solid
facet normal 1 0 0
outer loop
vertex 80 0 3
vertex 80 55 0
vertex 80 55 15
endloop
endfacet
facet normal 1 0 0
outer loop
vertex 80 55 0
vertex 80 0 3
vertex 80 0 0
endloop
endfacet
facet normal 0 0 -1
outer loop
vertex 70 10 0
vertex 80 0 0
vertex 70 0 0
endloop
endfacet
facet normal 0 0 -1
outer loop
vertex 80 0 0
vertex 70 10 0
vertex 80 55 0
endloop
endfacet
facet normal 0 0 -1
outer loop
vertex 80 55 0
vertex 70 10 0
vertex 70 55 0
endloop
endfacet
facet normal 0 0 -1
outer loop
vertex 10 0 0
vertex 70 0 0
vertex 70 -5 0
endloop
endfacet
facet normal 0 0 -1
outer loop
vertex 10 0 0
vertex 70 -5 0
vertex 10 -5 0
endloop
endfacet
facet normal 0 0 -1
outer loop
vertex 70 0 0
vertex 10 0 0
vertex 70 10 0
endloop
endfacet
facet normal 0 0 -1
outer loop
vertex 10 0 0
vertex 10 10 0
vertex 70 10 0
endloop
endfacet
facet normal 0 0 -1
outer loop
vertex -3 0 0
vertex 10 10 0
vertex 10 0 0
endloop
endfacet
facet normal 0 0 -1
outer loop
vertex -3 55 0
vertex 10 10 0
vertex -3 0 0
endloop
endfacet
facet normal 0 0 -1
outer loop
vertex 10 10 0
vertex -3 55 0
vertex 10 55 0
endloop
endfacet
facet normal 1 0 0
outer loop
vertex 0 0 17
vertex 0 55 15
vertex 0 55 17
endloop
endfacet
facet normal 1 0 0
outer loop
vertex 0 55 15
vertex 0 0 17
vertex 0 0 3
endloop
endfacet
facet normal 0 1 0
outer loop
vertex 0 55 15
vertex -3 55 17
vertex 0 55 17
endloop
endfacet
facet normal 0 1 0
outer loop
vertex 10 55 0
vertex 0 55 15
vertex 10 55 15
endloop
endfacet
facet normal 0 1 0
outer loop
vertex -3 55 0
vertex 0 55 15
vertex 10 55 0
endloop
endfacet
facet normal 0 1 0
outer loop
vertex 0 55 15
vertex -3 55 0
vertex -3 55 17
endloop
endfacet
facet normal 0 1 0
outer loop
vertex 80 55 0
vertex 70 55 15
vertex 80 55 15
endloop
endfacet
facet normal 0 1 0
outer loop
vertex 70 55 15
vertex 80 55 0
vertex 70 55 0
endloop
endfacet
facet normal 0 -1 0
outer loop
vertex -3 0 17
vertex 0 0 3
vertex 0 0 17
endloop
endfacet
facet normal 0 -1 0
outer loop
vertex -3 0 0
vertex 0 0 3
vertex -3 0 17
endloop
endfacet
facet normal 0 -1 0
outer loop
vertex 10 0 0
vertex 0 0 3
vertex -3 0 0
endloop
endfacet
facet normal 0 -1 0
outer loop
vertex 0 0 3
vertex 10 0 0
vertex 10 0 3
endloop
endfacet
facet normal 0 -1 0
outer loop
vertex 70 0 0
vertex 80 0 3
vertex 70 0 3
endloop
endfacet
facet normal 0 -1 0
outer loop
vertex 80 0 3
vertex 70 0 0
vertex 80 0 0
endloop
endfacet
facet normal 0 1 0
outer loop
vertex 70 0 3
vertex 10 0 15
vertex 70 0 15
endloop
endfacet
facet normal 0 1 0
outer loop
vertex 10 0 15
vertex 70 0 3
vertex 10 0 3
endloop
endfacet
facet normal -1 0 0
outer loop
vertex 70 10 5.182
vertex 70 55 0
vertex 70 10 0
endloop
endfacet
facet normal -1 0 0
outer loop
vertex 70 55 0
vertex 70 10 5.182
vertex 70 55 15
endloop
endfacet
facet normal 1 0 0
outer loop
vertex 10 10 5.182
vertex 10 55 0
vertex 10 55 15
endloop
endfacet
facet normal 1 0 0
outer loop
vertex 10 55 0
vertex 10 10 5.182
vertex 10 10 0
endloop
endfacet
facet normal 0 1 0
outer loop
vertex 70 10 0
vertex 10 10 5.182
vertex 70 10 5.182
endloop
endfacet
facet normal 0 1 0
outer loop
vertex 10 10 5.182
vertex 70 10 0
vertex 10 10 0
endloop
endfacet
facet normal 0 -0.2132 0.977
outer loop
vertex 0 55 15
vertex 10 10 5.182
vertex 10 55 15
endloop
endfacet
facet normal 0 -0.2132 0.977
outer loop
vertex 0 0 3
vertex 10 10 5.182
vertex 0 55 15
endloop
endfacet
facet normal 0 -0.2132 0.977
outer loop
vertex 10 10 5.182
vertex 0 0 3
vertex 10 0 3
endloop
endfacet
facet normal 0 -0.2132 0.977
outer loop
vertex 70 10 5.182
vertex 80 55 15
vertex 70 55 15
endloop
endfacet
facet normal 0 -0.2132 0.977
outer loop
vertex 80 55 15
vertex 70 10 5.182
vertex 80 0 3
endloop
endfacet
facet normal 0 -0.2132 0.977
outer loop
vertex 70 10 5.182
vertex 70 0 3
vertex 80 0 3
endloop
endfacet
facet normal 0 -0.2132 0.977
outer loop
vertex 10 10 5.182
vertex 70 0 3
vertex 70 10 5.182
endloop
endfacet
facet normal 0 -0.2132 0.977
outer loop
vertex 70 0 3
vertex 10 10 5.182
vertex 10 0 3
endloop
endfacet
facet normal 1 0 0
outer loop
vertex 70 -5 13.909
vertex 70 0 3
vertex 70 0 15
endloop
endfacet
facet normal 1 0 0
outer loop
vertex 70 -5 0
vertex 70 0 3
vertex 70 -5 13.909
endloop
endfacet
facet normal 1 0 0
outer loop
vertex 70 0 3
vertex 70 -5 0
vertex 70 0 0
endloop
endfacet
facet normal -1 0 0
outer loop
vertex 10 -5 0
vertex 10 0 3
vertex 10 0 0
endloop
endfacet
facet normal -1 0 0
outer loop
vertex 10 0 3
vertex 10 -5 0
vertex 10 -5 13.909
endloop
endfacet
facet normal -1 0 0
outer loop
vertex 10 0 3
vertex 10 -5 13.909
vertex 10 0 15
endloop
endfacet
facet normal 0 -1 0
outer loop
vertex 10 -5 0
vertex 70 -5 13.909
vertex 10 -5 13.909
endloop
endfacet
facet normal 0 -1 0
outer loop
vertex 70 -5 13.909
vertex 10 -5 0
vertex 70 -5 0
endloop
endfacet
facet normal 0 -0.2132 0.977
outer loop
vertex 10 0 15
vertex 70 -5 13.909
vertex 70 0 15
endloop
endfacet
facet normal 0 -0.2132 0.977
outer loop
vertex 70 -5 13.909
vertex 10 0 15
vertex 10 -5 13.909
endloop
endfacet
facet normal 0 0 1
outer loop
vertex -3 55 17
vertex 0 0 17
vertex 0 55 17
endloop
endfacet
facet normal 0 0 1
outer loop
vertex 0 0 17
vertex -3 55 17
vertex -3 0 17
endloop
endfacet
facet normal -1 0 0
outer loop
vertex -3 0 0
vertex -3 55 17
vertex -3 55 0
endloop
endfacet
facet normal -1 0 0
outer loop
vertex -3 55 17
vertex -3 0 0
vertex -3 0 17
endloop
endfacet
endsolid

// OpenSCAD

	//catan - (80,55,15)

	card_x = 80;
	card_y = 55;
	card_z = 15;
	bottom_z = 3;
	inner_offset = 10;
	top_wall_x = 3;
	top_wall_z = 17;
	side_wall_y = 5;

	tanlength = sqrt(pow(card_y,2)+pow((card_z-bottom_z),2));
	module slice() {
		translate([0,0,bottom_z])  {
			rotate([atan((card_z-bottom_z)/card_y),0,0]) {
				cube([card_x,tanlength,card_z]);
			}
		}
	}
	union(){
		difference() {
			difference() {
				cube([card_x,card_y,card_z]);
				translate([inner_offset,inner_offset,0]){
					cube([card_x-(inner_offset*2),card_y-inner_offset,card_z]);
				}			
			}
			slice();
		}
		difference(){
			translate([inner_offset,-side_wall_y,0]){
				cube([card_x-(inner_offset*2),side_wall_y,card_z]);
			}
			translate([0,-card_y,0]){
				slice();
			}
		}
		translate([-top_wall_x,0,0]){
			cube([top_wall_x,card_y,(top_wall_z)]);
		}
	}






